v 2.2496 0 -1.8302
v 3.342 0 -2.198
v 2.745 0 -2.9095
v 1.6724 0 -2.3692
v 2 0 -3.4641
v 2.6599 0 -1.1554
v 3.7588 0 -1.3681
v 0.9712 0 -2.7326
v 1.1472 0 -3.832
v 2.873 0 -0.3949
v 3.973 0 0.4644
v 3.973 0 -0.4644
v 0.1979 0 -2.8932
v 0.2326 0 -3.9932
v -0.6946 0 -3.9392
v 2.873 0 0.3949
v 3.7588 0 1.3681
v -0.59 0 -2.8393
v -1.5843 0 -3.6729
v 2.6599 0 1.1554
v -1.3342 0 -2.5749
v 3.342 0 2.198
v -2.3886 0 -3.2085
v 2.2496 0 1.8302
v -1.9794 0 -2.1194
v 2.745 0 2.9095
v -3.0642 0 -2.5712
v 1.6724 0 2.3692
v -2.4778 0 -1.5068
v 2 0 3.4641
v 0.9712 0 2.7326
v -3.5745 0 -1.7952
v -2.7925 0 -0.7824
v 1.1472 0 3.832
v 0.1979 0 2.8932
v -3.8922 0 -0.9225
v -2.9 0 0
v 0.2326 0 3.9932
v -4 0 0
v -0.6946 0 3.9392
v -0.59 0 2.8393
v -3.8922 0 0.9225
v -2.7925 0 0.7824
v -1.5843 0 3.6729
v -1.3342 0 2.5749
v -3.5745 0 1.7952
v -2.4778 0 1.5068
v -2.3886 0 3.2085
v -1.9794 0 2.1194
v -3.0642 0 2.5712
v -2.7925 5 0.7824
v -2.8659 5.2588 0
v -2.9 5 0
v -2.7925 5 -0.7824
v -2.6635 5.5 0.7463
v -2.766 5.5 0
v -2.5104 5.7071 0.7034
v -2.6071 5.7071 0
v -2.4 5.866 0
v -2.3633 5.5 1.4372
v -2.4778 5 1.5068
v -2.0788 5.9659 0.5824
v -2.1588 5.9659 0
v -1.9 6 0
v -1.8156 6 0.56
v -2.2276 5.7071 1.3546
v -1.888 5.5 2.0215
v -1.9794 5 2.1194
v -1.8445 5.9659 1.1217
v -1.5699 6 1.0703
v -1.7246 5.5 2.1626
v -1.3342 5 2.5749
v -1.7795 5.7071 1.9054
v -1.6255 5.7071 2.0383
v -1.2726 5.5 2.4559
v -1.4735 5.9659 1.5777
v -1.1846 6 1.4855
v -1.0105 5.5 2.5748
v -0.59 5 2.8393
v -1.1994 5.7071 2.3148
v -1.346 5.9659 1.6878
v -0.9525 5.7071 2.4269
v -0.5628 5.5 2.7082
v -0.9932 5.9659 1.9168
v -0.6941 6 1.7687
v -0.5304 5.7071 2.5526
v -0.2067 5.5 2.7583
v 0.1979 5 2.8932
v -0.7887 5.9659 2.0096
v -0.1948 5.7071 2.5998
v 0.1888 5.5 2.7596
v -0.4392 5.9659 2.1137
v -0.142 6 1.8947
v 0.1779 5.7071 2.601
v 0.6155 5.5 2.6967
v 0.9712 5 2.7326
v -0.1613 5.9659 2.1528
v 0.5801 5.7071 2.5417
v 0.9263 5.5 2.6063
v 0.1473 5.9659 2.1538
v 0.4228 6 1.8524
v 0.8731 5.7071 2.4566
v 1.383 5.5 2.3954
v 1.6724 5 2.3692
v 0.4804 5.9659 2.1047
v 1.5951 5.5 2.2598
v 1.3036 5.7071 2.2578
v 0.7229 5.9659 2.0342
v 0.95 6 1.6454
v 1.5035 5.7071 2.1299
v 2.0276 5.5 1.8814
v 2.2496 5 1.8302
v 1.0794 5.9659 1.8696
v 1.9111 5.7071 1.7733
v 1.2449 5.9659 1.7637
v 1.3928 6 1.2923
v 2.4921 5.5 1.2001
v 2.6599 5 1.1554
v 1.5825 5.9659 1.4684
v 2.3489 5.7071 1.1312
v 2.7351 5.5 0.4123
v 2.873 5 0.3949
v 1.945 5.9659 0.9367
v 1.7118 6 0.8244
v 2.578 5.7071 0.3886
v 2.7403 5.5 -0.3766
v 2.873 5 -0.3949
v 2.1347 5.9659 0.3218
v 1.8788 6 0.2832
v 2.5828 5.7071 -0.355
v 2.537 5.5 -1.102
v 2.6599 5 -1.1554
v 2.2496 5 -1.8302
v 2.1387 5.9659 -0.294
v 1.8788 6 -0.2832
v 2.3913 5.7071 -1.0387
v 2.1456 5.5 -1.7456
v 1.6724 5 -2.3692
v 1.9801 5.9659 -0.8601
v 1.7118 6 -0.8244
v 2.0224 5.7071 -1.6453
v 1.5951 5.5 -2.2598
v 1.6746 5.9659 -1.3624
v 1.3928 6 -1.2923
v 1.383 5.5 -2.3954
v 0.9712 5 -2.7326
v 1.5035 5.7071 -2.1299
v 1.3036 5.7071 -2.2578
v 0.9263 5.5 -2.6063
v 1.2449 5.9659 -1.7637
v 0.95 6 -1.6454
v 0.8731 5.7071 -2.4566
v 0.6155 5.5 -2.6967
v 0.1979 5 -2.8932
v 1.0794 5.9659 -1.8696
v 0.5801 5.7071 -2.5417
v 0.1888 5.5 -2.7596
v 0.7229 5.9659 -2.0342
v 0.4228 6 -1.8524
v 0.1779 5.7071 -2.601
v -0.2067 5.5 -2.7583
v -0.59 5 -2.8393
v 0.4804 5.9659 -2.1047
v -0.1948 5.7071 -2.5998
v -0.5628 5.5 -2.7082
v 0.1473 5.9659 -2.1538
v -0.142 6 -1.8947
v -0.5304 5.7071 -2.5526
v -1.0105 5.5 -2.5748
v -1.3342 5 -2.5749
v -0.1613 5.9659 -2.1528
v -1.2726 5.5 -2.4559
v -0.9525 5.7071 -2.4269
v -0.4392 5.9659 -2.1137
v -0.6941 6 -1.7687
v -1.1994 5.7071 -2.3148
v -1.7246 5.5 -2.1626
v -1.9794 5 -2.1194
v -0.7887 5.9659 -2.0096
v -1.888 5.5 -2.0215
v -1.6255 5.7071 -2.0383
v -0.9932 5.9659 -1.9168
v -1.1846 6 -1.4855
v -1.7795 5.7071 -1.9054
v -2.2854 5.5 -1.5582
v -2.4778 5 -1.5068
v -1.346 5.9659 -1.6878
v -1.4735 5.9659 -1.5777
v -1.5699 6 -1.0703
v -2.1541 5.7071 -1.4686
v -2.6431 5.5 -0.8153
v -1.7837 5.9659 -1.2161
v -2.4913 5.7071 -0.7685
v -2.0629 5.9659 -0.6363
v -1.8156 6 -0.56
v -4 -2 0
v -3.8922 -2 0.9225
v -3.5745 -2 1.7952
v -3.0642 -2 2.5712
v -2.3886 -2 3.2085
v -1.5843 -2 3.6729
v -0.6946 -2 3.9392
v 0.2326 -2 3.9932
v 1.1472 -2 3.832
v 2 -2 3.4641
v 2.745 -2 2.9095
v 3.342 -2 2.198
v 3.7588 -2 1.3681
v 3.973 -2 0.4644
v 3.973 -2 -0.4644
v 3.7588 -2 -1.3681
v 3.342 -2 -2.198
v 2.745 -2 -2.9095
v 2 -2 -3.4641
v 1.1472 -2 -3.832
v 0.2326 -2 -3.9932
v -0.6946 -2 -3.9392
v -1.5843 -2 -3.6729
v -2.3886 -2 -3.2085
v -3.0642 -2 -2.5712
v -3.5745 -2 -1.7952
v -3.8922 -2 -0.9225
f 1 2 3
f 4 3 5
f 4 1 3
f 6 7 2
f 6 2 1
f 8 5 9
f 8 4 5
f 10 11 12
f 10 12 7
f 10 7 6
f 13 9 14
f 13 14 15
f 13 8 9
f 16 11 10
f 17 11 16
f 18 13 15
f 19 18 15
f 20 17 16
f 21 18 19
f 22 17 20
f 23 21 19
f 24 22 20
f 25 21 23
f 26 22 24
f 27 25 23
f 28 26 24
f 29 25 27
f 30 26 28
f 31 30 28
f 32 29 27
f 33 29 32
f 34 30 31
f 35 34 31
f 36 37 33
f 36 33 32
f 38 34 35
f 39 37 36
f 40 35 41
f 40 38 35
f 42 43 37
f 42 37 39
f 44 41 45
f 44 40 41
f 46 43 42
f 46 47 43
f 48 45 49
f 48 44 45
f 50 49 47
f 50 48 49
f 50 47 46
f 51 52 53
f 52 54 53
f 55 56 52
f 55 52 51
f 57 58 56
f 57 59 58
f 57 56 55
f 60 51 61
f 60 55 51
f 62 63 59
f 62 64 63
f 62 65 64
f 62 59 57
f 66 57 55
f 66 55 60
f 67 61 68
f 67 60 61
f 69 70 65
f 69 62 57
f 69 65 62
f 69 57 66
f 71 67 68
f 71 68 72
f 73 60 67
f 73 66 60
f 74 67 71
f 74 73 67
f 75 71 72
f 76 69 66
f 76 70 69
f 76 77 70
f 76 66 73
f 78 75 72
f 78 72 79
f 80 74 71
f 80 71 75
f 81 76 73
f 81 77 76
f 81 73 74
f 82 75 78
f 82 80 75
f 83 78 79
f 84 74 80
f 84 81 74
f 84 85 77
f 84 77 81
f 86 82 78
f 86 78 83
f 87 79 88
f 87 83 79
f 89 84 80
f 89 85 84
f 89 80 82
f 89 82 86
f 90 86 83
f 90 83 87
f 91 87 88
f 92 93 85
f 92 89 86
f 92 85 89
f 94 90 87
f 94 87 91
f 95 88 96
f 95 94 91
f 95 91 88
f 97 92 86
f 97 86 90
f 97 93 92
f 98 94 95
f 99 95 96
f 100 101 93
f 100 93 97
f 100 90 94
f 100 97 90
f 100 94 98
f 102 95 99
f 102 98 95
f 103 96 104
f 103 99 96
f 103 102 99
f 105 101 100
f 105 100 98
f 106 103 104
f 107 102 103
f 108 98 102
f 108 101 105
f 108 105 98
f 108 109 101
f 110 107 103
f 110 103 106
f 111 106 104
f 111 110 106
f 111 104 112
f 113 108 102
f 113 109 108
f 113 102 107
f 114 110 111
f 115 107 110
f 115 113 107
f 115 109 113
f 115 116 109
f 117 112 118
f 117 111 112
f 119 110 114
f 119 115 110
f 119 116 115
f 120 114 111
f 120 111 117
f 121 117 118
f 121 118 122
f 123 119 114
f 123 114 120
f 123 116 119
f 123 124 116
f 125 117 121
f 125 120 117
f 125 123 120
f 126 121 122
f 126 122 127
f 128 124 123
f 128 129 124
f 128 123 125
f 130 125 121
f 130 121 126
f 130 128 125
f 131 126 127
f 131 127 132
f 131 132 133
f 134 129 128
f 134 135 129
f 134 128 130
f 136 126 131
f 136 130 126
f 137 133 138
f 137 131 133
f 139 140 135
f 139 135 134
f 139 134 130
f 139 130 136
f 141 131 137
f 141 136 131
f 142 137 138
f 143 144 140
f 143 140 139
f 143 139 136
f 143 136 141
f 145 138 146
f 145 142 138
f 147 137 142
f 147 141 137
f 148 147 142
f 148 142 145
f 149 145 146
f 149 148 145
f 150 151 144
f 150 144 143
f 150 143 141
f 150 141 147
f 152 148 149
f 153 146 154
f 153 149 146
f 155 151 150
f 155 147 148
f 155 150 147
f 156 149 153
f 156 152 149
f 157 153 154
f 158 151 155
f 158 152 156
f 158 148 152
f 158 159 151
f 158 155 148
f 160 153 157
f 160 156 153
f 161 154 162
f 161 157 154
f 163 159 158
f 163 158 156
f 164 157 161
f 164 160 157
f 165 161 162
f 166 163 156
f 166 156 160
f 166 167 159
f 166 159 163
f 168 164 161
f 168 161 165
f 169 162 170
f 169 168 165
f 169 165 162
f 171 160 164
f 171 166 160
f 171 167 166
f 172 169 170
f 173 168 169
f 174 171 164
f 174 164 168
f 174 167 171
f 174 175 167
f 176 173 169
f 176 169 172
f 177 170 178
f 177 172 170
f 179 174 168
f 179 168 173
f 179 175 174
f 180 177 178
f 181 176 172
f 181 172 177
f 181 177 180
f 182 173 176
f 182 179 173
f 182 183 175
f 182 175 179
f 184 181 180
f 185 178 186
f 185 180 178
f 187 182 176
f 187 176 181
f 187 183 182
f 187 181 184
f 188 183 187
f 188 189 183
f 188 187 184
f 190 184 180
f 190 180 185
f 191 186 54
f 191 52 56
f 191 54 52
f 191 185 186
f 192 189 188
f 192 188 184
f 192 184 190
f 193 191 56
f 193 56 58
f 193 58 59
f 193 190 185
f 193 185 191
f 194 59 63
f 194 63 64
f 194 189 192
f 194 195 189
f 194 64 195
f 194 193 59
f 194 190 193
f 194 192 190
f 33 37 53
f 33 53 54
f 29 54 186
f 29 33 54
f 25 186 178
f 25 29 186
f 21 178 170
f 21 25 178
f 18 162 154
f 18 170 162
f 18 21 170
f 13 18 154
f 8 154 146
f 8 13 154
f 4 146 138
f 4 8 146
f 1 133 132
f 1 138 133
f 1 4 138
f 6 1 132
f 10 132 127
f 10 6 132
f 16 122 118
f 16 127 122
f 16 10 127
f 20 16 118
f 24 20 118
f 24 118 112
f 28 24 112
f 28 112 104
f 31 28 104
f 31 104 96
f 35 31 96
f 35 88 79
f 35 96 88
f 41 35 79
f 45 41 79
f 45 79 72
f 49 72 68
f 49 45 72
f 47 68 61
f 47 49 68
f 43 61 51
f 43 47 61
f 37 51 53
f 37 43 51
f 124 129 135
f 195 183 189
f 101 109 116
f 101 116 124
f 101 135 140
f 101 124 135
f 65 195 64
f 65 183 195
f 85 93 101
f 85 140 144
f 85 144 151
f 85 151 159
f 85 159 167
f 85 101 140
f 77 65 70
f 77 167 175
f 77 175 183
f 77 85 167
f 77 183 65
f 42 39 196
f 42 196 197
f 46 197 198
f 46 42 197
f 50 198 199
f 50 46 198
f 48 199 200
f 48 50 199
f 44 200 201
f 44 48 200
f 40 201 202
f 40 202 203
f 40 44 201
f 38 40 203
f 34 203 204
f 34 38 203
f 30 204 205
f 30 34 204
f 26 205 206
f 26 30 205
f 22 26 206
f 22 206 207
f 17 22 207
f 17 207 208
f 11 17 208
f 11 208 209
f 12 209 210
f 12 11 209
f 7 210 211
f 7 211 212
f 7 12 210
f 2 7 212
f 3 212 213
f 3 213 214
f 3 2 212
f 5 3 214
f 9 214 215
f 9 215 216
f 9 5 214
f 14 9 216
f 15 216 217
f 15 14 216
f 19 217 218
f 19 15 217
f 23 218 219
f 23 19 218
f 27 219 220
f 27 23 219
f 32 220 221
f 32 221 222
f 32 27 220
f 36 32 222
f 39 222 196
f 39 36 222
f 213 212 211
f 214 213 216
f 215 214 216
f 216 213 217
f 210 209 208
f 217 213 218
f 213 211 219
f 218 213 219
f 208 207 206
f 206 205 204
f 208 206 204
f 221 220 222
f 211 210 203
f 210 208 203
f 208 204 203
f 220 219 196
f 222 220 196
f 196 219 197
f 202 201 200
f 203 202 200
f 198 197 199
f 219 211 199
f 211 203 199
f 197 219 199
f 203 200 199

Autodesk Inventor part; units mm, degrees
ref_plane "YZ Plane" through (0, 0, 0) normal (1, 0, 0) x (0, 1, 0)
ref_plane "XZ Plane" through (0, 0, 0) normal (0, 1, 0) x (-1, 0, 0)
ref_plane "XY Plane" through (0, 0, 0) normal (0, 0, 1) x (1, 0, 0)
sketch "Sketch1" plane through (0, 0, 0) normal (0, 1, 0) x (-1, 0, 0)
  circle A0 centre (0, 0) radius 4
  circle A1 centre (0, 0) radius 2.9
  dimension "d0" = 8
  dimension "d1" = 5.8
extrude "Extrusion1" add sketch "Sketch1" against normal blind 2 contours A0 | A1
extrude "Extrusion2" add sketch "Sketch1" along normal blind 6 contours A1
fillet "Fillet1" radius 1 1 edges at (2.9, 6, 0)
properties part number "Button_3DPrint"
